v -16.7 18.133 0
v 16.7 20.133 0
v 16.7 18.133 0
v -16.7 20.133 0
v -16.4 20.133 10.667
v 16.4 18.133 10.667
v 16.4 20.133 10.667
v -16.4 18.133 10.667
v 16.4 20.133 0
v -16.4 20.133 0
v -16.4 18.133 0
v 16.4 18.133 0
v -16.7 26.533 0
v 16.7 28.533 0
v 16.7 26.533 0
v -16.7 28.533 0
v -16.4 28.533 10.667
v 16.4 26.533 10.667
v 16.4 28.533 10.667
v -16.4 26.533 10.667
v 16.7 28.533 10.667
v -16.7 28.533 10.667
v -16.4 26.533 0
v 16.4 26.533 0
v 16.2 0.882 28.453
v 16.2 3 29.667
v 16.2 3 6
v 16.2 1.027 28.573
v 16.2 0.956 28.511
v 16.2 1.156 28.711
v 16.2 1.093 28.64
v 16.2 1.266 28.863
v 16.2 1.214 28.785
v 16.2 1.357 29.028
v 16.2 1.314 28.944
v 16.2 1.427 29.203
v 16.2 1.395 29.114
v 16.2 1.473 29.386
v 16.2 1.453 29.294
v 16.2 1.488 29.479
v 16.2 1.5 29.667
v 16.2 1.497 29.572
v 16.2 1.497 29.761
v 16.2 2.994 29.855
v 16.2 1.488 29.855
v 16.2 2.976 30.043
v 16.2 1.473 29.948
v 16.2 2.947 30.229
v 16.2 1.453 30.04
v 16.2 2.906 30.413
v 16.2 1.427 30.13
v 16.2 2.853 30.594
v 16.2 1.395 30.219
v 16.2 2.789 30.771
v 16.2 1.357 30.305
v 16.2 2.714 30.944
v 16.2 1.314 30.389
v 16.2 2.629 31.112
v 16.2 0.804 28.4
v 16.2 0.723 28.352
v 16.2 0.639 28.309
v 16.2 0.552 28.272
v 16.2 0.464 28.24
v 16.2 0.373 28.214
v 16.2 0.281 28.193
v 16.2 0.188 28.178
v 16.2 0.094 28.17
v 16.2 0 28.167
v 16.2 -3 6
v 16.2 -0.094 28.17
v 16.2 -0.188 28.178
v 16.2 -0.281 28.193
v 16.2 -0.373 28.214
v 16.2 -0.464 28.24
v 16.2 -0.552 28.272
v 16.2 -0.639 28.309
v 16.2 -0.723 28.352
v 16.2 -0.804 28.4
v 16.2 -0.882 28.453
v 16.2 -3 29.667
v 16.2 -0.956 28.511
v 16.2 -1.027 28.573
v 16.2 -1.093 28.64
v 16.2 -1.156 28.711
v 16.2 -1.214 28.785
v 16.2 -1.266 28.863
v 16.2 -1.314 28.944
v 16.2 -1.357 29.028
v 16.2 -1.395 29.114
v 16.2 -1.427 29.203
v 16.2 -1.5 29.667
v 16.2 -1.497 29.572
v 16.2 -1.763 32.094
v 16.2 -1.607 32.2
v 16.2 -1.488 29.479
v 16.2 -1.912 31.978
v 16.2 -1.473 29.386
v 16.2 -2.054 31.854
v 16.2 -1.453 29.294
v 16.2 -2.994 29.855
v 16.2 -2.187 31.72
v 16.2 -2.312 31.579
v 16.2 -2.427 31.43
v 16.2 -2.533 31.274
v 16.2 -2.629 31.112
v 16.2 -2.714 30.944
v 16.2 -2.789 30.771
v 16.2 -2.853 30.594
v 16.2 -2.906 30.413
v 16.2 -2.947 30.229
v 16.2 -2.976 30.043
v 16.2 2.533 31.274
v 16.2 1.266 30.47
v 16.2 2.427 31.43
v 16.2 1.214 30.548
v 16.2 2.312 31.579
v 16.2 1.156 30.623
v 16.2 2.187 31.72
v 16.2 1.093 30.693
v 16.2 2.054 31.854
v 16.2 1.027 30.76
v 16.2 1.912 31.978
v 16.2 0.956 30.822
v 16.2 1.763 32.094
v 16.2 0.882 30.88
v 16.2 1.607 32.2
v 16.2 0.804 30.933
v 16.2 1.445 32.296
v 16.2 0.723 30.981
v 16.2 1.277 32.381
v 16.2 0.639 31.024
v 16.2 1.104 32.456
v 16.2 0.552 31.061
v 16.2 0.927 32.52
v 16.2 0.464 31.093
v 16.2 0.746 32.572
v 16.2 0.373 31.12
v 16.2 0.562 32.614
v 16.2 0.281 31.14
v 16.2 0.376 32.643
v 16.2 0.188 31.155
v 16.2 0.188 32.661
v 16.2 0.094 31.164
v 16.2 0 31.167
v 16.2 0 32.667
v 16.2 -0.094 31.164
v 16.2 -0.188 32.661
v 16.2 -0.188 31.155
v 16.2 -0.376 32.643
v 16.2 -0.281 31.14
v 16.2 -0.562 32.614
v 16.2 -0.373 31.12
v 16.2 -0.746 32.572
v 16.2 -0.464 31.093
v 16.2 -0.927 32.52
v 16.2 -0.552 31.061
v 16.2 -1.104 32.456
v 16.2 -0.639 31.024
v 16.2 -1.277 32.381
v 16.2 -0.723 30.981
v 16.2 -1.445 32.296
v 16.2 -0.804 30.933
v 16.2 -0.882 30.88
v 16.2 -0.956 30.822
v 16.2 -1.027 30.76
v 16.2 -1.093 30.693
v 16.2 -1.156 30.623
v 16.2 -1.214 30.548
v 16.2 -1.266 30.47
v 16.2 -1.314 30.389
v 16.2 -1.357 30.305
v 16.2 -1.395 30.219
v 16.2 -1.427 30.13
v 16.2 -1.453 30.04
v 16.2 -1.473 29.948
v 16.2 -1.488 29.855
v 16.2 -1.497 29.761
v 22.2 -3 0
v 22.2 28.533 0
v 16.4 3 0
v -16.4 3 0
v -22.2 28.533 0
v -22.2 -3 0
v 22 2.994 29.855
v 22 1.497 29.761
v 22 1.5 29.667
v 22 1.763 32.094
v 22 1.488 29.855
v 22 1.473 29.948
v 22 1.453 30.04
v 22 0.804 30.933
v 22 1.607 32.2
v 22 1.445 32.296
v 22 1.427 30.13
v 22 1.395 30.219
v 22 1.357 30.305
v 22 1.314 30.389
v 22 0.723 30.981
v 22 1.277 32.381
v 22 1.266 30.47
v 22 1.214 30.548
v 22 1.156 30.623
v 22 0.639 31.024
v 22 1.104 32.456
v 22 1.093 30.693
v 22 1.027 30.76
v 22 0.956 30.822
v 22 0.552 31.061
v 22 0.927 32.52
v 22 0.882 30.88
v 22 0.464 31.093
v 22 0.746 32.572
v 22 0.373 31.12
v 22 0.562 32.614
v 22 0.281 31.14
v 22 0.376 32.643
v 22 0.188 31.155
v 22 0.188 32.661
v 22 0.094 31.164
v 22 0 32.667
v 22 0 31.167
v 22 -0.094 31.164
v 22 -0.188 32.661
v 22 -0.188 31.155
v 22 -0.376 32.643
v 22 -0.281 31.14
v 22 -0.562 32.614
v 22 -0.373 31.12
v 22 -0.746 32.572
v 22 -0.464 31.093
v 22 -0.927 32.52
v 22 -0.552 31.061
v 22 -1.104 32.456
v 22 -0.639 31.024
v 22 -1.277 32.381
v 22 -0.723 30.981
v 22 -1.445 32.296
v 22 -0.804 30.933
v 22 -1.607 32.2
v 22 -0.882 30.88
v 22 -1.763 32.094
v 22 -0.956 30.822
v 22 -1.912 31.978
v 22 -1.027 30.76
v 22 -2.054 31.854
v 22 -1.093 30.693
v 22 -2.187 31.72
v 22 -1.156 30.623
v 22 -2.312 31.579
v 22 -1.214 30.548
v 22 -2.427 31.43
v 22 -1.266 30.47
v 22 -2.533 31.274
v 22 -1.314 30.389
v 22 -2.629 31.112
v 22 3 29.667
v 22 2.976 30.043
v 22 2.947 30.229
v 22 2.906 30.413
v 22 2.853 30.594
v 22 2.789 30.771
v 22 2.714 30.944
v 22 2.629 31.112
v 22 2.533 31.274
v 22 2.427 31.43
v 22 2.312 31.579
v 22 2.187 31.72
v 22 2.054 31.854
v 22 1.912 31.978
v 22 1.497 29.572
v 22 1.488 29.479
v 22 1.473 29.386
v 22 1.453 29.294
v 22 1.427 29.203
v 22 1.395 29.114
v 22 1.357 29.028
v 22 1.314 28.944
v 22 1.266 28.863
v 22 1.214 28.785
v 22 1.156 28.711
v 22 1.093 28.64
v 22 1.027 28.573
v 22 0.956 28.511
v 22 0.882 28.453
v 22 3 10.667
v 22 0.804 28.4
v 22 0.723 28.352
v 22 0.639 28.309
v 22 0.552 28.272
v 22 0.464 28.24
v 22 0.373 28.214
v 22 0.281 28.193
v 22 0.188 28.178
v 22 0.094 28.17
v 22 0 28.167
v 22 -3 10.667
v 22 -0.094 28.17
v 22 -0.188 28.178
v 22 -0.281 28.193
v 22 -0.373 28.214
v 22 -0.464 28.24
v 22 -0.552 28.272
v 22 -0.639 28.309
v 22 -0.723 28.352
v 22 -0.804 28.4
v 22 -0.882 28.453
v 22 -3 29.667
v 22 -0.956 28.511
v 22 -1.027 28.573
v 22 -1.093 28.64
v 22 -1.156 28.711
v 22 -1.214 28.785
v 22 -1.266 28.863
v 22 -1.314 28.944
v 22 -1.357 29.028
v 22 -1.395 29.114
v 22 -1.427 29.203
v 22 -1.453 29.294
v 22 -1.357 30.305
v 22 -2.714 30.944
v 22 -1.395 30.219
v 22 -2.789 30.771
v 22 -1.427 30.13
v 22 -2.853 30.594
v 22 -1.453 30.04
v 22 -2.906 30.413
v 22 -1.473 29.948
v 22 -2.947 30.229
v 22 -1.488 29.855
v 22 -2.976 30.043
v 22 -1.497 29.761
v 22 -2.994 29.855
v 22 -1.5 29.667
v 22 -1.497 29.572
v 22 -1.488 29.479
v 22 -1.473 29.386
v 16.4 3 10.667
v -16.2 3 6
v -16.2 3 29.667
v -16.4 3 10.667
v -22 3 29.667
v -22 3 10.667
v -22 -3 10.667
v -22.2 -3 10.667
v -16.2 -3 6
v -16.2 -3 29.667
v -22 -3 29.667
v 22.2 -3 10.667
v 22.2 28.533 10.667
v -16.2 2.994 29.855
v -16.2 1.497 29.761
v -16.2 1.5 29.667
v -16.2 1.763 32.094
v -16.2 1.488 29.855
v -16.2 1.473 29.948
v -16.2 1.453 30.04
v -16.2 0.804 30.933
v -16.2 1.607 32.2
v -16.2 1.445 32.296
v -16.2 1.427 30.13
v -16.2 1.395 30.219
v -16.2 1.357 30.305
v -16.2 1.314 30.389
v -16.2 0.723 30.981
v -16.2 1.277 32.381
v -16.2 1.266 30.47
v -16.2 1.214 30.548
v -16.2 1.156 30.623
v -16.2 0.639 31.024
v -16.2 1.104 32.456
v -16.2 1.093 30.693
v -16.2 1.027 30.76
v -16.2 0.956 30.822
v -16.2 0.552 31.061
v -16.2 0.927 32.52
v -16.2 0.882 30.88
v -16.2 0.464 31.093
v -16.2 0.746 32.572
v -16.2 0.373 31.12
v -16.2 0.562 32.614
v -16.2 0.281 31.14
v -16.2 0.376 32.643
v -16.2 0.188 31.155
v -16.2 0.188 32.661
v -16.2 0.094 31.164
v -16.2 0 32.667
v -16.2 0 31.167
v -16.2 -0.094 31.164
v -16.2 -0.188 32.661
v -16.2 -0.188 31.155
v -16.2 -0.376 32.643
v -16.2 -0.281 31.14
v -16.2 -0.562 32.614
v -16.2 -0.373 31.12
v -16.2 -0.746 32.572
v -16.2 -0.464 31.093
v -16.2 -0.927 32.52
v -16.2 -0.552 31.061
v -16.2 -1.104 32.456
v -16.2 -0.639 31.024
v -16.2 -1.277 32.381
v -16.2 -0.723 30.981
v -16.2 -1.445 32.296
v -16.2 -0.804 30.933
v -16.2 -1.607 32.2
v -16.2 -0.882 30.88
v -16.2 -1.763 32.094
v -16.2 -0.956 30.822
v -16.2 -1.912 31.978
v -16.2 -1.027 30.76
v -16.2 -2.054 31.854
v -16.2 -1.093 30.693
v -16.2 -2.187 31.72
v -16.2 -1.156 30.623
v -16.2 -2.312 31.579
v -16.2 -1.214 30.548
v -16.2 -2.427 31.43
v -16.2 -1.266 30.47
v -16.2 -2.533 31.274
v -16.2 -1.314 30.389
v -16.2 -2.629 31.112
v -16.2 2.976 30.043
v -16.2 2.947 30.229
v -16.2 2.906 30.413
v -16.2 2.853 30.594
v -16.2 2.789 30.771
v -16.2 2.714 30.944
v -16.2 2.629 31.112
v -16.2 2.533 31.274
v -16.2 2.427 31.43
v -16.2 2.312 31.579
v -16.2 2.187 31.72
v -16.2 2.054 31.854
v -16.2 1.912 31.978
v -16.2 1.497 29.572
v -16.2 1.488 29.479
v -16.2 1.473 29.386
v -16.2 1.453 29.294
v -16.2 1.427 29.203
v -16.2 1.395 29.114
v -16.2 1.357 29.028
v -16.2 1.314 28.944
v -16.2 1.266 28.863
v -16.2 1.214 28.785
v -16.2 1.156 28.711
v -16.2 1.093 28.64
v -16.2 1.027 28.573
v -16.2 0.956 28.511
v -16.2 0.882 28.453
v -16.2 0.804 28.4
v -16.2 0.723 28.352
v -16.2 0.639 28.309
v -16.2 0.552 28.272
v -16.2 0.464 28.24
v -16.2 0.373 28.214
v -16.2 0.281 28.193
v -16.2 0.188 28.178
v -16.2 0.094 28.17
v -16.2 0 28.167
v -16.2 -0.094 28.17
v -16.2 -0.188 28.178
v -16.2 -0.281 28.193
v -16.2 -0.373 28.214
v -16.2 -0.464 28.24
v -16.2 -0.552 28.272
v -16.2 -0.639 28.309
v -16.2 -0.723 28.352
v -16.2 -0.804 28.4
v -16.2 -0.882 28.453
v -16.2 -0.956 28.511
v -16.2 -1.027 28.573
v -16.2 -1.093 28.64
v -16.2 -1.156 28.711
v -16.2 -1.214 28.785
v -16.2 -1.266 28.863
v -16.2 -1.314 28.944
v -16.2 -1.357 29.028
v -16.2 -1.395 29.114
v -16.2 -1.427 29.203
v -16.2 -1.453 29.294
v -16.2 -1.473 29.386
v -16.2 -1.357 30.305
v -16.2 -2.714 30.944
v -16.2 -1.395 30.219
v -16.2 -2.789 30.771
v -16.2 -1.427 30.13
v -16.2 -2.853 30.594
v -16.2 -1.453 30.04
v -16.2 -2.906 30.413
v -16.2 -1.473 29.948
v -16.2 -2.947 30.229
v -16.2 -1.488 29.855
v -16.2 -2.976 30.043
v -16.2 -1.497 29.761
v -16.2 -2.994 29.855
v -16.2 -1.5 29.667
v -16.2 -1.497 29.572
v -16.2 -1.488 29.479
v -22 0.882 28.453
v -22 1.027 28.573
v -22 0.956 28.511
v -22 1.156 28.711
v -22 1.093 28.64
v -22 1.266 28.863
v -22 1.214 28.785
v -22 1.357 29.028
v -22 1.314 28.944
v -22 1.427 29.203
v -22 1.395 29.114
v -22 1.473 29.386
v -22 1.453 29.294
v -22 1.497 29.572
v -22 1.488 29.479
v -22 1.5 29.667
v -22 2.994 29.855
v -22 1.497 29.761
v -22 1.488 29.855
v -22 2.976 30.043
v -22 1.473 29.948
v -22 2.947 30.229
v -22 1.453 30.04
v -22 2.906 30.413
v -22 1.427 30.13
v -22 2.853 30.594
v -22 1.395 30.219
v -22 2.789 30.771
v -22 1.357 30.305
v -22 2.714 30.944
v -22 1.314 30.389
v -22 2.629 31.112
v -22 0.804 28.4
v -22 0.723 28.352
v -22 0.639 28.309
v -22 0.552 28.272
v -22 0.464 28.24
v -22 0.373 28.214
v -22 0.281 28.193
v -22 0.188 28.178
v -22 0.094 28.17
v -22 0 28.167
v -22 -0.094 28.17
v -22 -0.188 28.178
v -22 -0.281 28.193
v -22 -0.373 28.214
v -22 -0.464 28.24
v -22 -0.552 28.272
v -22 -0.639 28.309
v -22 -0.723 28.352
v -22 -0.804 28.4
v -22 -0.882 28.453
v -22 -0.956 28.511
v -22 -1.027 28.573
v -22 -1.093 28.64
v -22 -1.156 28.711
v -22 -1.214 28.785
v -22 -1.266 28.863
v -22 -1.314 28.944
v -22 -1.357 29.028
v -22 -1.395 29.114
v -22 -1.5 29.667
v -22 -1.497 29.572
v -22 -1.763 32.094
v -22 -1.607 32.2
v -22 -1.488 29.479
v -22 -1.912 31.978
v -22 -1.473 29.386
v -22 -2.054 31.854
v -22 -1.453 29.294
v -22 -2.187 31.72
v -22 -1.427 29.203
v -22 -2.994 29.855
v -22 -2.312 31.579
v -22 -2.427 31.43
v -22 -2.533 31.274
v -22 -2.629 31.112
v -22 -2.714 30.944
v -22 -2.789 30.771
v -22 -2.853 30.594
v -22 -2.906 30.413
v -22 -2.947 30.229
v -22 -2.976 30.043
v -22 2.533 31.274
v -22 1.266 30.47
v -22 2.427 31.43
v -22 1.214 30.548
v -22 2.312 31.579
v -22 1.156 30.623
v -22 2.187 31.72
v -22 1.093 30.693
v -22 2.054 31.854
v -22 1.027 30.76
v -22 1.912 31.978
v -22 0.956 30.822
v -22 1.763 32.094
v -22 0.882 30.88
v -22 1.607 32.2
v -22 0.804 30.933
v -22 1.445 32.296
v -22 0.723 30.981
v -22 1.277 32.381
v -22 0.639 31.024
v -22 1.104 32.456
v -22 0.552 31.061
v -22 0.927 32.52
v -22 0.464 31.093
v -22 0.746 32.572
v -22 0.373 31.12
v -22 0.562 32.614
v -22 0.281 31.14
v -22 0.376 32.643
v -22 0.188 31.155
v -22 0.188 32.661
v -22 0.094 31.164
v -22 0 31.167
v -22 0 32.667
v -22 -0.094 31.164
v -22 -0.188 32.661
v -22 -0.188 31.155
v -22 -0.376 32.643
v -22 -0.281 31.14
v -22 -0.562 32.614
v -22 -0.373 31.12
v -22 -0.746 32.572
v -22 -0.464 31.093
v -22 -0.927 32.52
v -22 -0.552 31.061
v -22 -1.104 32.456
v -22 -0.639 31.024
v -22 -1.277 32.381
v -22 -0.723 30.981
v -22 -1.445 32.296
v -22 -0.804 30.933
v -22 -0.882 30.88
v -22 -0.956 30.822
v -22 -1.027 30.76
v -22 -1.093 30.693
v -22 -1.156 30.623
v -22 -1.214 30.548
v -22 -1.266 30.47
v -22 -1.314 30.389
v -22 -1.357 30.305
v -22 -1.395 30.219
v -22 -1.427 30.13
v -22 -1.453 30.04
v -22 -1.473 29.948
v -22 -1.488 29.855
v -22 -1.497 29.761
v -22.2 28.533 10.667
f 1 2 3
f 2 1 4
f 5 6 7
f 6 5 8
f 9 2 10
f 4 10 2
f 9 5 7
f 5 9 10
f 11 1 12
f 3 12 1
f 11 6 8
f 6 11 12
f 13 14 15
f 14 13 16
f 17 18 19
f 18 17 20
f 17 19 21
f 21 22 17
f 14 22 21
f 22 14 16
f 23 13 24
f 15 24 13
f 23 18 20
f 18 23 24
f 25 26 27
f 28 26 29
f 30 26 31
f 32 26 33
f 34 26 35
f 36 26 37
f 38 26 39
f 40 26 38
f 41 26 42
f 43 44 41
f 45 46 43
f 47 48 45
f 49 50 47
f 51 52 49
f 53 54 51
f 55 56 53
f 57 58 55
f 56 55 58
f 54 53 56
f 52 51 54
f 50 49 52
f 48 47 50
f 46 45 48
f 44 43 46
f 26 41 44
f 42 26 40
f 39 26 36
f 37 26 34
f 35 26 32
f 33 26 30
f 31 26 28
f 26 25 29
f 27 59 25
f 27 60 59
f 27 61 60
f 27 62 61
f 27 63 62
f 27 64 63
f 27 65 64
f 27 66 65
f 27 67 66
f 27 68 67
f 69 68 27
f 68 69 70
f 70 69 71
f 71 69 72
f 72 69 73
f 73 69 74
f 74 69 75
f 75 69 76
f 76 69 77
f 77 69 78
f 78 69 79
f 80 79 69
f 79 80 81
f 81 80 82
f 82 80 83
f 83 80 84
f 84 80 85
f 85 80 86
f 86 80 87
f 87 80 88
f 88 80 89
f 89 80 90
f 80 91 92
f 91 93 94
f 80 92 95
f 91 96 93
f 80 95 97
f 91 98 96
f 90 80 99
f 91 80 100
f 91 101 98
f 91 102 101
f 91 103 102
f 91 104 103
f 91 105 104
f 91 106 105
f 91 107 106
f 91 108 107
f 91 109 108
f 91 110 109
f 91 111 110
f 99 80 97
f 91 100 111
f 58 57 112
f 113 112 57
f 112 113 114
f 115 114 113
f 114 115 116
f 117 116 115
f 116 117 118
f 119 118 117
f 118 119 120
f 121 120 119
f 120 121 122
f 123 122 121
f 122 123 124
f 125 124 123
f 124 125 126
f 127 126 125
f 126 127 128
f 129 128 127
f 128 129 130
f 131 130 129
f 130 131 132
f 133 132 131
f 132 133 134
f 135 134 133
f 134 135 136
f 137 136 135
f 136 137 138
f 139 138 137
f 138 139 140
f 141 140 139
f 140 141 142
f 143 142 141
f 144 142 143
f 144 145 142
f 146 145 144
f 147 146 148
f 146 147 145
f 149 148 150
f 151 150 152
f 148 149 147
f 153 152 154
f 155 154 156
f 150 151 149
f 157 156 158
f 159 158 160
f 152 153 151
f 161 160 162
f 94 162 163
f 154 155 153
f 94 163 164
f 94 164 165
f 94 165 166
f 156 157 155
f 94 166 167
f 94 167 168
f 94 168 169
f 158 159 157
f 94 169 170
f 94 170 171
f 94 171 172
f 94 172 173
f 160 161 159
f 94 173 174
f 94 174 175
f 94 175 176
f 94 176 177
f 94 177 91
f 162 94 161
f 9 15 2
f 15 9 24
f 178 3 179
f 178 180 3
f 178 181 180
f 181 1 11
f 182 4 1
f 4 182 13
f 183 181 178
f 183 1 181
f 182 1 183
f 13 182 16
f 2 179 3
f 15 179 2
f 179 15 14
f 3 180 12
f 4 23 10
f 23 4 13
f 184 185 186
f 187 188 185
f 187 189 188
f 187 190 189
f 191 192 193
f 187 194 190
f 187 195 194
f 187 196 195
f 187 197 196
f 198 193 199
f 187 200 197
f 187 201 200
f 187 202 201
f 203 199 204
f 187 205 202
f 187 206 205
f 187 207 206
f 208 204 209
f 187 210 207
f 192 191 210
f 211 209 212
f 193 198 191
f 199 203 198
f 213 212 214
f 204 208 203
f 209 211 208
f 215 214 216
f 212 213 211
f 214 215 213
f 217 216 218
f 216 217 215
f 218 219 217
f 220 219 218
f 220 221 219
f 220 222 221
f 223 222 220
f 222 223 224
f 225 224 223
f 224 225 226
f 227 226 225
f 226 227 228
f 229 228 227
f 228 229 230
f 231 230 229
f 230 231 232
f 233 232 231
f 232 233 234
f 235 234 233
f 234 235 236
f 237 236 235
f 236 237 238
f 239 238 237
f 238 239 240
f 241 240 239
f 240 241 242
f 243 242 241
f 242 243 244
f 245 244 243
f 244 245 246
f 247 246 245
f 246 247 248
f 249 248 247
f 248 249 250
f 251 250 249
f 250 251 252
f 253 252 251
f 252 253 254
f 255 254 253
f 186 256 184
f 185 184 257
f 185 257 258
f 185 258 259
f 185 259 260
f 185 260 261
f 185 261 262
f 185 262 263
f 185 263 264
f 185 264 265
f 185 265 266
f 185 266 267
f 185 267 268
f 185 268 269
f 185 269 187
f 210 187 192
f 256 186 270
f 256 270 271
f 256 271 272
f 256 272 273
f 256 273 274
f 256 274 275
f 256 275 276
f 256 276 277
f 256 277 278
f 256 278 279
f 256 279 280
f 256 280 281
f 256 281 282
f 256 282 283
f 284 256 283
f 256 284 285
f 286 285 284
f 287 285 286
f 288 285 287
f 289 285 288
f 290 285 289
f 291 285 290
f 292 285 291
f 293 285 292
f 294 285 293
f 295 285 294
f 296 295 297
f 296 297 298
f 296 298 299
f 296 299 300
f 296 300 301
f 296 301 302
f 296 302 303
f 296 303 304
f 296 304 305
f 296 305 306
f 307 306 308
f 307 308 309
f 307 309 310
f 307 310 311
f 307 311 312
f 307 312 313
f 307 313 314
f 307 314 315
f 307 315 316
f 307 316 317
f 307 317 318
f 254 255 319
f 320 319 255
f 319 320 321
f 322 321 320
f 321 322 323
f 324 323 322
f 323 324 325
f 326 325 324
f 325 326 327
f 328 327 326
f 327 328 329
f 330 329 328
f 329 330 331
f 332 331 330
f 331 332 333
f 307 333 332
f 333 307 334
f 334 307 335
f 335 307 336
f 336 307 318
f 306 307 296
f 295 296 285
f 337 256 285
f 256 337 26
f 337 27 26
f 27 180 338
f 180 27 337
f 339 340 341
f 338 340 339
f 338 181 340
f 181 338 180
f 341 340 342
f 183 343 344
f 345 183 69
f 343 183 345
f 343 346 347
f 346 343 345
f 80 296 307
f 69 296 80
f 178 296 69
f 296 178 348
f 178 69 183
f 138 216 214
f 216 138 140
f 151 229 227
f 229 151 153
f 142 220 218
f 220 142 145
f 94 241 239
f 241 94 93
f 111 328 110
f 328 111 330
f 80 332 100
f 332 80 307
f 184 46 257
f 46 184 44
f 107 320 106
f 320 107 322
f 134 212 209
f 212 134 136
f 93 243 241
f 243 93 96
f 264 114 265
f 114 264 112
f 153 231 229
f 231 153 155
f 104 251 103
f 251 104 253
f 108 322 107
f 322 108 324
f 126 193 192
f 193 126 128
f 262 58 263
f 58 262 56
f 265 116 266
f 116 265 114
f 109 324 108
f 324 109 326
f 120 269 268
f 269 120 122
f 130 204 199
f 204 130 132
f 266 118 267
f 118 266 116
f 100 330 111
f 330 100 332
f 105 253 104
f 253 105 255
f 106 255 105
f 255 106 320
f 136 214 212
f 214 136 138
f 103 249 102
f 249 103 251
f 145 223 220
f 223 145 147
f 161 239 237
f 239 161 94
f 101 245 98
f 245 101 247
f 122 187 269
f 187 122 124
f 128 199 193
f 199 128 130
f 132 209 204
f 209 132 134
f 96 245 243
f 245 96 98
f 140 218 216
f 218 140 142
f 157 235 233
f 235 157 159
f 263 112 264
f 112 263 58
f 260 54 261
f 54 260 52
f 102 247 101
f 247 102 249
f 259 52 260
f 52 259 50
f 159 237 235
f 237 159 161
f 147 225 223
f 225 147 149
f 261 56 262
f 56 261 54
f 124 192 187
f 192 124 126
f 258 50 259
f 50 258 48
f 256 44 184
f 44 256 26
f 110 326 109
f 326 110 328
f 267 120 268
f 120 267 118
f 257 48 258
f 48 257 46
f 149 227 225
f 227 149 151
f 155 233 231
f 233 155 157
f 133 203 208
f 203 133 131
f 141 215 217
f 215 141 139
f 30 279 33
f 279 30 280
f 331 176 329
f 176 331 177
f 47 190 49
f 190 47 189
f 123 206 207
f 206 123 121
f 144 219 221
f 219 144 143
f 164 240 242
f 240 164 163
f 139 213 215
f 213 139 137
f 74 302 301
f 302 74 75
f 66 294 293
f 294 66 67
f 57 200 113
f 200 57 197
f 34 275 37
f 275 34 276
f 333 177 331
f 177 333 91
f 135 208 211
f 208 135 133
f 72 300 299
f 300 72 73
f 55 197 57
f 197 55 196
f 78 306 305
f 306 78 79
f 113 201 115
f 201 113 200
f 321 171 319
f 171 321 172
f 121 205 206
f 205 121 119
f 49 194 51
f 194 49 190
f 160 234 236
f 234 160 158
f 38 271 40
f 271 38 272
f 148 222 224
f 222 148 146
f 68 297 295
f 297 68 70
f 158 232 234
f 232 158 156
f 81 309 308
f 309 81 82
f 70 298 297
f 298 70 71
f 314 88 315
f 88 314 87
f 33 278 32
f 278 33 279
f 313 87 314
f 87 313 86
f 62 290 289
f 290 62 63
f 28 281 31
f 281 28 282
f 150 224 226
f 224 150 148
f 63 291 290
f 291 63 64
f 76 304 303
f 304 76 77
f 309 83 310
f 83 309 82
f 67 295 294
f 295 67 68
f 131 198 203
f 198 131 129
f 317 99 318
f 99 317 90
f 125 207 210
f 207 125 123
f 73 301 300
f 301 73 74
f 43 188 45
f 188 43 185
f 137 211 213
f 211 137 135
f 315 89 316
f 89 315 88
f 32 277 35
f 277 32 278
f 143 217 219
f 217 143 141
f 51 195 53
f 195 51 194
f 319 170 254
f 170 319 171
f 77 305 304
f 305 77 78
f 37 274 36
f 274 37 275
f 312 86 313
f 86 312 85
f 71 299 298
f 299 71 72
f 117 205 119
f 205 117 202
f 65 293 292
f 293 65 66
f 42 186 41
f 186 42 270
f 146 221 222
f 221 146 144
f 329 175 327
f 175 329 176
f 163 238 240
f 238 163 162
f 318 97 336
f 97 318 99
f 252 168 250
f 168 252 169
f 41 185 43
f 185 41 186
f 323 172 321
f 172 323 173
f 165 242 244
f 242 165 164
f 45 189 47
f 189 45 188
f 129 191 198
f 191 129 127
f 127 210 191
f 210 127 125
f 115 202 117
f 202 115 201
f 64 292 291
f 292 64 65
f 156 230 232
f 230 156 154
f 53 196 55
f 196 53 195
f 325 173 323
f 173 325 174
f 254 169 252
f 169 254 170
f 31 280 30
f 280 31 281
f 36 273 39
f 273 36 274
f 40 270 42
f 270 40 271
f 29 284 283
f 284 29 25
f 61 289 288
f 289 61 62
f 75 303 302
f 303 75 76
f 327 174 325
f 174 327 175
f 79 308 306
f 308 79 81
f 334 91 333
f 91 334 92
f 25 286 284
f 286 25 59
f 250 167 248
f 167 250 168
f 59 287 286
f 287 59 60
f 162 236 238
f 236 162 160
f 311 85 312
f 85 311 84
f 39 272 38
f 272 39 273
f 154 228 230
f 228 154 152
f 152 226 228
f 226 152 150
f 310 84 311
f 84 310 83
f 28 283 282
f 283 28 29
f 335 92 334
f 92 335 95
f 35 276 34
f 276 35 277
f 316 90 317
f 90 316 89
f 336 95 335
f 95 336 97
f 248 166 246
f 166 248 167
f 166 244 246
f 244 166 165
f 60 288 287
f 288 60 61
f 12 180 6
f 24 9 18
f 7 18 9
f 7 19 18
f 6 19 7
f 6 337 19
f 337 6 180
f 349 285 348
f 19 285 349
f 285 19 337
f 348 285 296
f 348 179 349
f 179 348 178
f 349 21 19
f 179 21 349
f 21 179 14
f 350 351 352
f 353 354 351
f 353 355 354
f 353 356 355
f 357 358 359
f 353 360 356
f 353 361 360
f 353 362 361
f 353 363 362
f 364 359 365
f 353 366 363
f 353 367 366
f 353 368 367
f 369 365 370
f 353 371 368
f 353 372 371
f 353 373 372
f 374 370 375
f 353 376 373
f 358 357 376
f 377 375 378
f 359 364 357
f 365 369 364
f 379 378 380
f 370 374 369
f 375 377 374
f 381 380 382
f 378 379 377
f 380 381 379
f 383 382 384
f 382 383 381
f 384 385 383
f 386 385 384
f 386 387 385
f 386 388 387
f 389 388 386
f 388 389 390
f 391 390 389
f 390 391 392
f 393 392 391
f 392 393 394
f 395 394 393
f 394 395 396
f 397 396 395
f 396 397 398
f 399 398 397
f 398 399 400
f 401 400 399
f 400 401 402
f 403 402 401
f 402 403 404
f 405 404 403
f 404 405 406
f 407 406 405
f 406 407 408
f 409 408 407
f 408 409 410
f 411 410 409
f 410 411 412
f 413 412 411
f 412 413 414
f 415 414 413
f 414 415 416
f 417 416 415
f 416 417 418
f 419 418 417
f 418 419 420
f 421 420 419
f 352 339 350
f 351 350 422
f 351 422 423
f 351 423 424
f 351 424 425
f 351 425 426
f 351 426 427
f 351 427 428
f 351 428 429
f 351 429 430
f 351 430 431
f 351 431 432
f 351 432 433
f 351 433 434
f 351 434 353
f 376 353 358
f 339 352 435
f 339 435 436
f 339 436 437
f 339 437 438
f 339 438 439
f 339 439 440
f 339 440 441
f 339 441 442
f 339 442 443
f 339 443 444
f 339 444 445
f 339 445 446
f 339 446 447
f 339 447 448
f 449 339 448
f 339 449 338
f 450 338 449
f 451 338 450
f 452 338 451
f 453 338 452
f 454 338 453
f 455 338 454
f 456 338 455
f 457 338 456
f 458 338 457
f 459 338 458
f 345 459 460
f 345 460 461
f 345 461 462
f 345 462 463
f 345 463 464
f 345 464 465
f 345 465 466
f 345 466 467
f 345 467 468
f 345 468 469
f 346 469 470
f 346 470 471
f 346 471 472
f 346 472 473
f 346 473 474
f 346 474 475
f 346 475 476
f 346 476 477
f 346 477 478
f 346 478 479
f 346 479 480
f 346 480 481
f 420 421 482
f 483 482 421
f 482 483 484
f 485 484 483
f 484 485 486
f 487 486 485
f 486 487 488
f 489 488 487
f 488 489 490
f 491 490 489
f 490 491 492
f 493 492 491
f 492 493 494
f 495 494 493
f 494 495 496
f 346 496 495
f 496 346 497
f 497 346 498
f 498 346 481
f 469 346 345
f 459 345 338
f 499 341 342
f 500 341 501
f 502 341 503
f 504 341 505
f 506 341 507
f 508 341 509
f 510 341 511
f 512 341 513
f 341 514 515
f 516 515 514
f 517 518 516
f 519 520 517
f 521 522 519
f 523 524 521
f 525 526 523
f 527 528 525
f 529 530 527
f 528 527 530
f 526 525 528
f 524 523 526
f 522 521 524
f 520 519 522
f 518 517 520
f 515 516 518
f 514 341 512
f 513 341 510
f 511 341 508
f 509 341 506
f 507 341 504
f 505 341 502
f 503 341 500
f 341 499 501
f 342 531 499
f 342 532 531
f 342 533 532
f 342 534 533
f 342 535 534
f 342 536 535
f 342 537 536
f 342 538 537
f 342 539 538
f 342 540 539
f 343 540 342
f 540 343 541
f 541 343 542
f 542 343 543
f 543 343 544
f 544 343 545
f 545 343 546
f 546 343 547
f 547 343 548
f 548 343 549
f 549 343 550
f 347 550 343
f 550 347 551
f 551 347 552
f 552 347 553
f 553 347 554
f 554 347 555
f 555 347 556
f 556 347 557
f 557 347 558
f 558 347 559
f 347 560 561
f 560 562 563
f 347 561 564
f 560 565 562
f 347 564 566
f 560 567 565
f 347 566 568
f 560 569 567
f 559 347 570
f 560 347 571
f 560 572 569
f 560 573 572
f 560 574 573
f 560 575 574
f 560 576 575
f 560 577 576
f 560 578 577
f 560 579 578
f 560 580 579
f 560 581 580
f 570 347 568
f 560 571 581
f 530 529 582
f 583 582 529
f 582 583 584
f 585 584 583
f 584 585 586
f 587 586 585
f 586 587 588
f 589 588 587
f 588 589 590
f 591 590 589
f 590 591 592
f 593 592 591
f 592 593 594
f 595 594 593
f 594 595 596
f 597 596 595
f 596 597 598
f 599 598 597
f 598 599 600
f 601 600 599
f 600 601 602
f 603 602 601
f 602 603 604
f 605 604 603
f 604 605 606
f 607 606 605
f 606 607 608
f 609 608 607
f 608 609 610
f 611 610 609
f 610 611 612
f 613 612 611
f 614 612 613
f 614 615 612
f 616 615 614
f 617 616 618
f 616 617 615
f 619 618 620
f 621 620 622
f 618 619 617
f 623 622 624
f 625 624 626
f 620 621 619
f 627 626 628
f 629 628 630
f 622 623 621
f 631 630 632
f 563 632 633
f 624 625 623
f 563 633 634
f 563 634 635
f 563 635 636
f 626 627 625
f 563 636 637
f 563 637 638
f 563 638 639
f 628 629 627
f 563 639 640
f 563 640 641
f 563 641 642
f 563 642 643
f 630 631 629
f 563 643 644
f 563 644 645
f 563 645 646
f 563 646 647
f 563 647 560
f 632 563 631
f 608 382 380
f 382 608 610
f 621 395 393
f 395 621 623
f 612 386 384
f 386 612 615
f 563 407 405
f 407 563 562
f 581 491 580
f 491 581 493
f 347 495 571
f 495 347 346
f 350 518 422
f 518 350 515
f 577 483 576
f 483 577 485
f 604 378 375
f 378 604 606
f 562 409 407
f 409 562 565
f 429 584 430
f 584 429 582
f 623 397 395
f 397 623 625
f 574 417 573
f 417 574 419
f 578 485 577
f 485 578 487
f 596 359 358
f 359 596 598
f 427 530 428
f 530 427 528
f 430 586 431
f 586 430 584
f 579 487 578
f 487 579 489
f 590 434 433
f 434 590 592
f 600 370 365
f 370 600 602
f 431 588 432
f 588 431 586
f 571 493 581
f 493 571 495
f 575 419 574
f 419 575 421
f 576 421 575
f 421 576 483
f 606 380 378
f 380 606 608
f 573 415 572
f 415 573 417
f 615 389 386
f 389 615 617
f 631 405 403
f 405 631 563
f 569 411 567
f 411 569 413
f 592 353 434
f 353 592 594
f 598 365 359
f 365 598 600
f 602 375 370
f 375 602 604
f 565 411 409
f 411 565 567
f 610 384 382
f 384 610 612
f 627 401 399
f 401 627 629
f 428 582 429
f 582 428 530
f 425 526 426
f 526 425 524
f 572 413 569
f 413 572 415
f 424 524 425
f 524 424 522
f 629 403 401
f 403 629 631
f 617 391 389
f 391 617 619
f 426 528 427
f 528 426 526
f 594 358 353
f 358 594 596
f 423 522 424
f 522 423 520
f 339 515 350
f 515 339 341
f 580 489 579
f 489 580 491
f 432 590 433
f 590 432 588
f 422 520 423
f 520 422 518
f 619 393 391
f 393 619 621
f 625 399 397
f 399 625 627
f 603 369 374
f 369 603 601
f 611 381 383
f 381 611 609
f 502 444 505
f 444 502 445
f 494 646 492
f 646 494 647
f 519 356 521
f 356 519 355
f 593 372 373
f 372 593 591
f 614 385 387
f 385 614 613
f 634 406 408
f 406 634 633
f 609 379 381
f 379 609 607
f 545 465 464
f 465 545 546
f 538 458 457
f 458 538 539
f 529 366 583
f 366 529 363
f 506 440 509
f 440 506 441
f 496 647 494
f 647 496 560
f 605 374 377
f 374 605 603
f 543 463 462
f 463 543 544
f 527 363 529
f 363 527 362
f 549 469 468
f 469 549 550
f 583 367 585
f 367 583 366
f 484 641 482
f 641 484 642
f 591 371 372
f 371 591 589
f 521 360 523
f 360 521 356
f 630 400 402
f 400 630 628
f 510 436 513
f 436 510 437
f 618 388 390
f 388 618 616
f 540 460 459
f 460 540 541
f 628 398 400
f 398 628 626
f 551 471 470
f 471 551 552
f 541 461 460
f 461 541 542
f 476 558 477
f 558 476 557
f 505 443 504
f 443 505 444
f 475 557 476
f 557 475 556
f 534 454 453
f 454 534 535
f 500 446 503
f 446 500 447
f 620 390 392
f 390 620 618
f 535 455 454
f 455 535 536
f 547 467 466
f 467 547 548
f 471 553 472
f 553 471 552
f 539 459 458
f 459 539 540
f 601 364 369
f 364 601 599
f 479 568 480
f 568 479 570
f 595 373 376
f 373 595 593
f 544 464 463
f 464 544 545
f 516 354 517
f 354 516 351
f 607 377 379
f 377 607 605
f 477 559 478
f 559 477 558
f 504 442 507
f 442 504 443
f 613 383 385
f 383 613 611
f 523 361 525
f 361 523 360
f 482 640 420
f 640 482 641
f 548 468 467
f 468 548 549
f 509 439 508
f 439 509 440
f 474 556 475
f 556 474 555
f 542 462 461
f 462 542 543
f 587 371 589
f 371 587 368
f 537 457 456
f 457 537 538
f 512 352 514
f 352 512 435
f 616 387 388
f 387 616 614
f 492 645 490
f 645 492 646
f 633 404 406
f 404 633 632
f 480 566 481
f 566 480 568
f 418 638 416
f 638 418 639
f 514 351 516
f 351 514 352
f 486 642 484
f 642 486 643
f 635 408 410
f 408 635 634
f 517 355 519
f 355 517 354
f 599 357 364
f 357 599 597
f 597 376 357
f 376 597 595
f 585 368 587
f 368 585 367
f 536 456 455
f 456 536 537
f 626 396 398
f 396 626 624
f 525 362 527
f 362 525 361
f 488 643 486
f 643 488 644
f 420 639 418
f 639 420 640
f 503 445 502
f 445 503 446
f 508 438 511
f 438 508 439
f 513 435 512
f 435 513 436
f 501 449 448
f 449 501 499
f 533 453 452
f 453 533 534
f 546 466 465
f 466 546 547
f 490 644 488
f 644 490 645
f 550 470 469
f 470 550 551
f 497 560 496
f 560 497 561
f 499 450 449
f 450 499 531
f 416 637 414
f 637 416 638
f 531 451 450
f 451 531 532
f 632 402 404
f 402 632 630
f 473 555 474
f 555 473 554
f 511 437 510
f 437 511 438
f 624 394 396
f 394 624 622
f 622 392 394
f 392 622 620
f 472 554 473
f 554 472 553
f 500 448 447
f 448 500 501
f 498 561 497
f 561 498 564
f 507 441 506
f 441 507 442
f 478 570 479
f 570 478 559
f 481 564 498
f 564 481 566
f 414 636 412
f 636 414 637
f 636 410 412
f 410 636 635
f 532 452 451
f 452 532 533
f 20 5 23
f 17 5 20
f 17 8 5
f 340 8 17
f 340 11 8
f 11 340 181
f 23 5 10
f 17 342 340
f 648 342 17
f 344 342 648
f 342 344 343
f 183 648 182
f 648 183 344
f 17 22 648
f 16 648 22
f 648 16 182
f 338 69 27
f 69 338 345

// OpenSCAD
// file: hinge.scad
function side_len(hyp, other) = sqrt(hyp*hyp - other * other);
function hyp_len(side1, side2) = sqrt(side1*side1 + side2*side2);

module outer_hinge(outer_diam, axis_diam, inner_width, outer_width, gap)
{
  difference() {
    total_width = inner_width + outer_width * 2;
    union() {
      cylinder(d = outer_diam, h= total_width, center = true);
      inner_radius = hyp_len(inner_width /2 + gap, outer_diam /2);
      rotate([0,90,0]) {
	difference() {
	  cylinder(d=total_width, h=outer_diam, center = true);
	  cylinder(r=inner_radius, h=outer_diam+1, center = true);
	  translate([-total_width, 0, -outer_diam]) {
	    cube([total_width*2 , total_width , outer_diam *2]);
	  }
	}
      }
    }
    cylinder(d = axis_diam, h = total_width + 1, center = true);
    cylinder(d =outer_diam * 1.1, h = inner_width + gap * 2, center = true);
  }
}

module inner_hinge(outer_diam, axis_diam, inner_width)
{
  difference() {
    cylinder(d =outer_diam, h = inner_width, center = true);
    cylinder(d =outer_diam, h = inner_width+1, center = true);
  }
}
$fn = 100;

outer_diam = 6;
axis_diam = 3;
inner_width = 10;
outer_width = 4;
gap = 0.2;
outer_hinge(outer_diam, axis_diam, inner_width,outer_width, gap);
inner_hinge(outer_diam, axis_diam, inner_width);
// file: params.scad
width = 6;
lower_length = 80;
upper_length = 70;
scale = 1/3;
axis_diam = 3;
hinge_inner = 10;
hinge_outer = 5;
slide_diam = 8;
slide_offset = 12;
upper_strut_dist = 16;
guide_thickness = 2;
gap = 0.2;
$fn=100;
// file: leg.scad
use <hinge.scad>

include <params.scad>

module lower_leg(width, length, upper_strut_dist, axis_diam, hinge_inner)
{
  difference() {
    union() {
      translate([0,0,-lower_length+width/2]) {
	intersection() {
	  translate([-width/2, -width/2, -width/2]) {
	    cube([width, width, lower_length + upper_strut_dist]);
	  }
	  cylinder(d1=width, d2= width*5, h=  lower_length + upper_strut_dist + 1);
    }
	sphere(d=width);
      }
      rotate([0,90,0]) {
	cylinder(d=width, h = hinge_inner, center = true);
      }
      translate([0,0,upper_strut_dist]) {
	rotate([0,90,0]) {
	  cylinder(d=width, h = hinge_inner, center = true);
	}
      }
    }
    // Holes
    rotate([0,90,0]) {
      cylinder(d=axis_diam, h = hinge_inner+1, center = true);
    }
    translate([0,0,upper_strut_dist]) {
      rotate([0,90,0]) {
	cylinder(d=axis_diam, h = hinge_inner+1, center = true);
	}
    }
  }
}


module upper_strut(width, length, scale, axis_diam, hinge_inner, hinge_outer, gap) {
  hinge_offset = (hinge_inner + hinge_outer)/2;
  
  translate([-length + hinge_offset,-width/2, -width/2]) {
    cube([length * (1+scale) - hinge_offset * 2, width, width]);
  }
 
   
  translate([-length,0,0]) {
    rotate([0,90,90]) {
      outer_hinge(width,axis_diam, hinge_inner, hinge_outer, gap);
    }
  }
  translate([length*scale,0,0]) {
    rotate([0,90,-90]) {
      outer_hinge(width,axis_diam, hinge_inner, hinge_outer, gap);
    }
  }
  
}

module upper_leg(width, length, scale, axis_diam, hinge_inner, hinge_outer, gap, slide_diam, slide_offset) {
  hinge_offset = (hinge_inner + hinge_outer)/2;
  difference() {
    union() {
      translate([-length + hinge_offset,-width/2, -width/2]) {
	cube([length * (1+scale) - hinge_offset, width, width]);
      }
      
      
      translate([-length,0,0]) {
	rotate([0,90,90]) {
	  outer_hinge(width,axis_diam, hinge_inner, hinge_outer, gap);
	}
      }

      // Inner hinges
      cylinder(d=width*2, h= width, center = true);

      translate([length*scale,0,0]) {
	rotate([90,0,0]) {
	  cylinder(d=width, h= hinge_inner, center = true);
	}
      }

      // Guide ball
      translate([length*scale,0,0]) {
	translate([0,0, -slide_offset+slide_diam/2]) {
	  cylinder(d=width, h = slide_offset - slide_diam /2);
	  sphere(d=slide_diam);
	}
      }
    }

    // Holes
    cylinder(d=axis_diam, h= width+1, center = true);

    translate([length*scale,0,0]) {
      rotate([90,0,0]) {
	cylinder(d=axis_diam, h= hinge_inner+1, center = true);
      }
    }
  }
}

module guide_strut(width, length, upper_strut_dist, scale, axis_diam, hinge_inner, hinge_outer, gap) {
  hinge_offset = (hinge_inner + hinge_outer)/2;
  difference() {
    union() {
      rotate([-90,0,90]) {
	outer_hinge(width,axis_diam, hinge_inner, hinge_outer, gap);
      }
      translate([0,width*0.1,hinge_offset]) {
	cylinder(d=width*0.8,h=length*scale - hinge_offset);
      }
      translate([-width/2,-width/2,hinge_offset]) {
	cube([width, width, upper_strut_dist - hinge_offset]);
      }
      translate([0,0, upper_strut_dist]) {
	rotate([90,0,90]) {
	  cylinder(d=width,h=hinge_inner, center = true);
	}
      }
      translate([0,0, length*scale]) {
	sphere(d = width);
      }
    }
    translate([0,0,upper_strut_dist]) {
      rotate([90,0,90]) {
	cylinder(d=axis_diam, h= hinge_inner+1, center = true);
      }
    }
  }
}

module gimbal(width, axis_diam, hinge_inner, hinge_outer, gap)
{
  inner_width = hinge_inner + hinge_outer*2;

  for (a = [0,180]) {
    rotate([0,a,0]) {
      translate([0,0,width + gap]) {
	difference() {
	  cube([inner_width+width, width,width], center=true);
	  cylinder(d=axis_diam, h=width+1,center = true);
	}
      }
      translate([-(inner_width+width)/2,0,0]) {
	difference() {
	  union() {
	    cube([width, width,(width+gap)*2], center=true);
	    translate([0,0,(width+gap)]) {
	      rotate([90,0,0]) {
		cylinder(d=width, h=width, center=true);
	      }
	    }
	    translate([0,0,-(width+gap)]) {
	      rotate([90,0,0]) {
		cylinder(d=width, h=width, center=true);
	      }
	    }
	  }
	  rotate([0,90,0]) {
	    cylinder(d=axis_diam, h=width + 1, center = true);
	  }
	}
      }
    }
  }
    
}

module base(upper_length, lower_length, scale, guide_thickness, width, axis_diam, hinge_outer, hinge_inner, upper_strut_dist) {
  guide_length= hinge_inner + hinge_outer*2 + gap *2+width*2+1;
  guide_height = lower_length * scale - upper_strut_dist;
  translate([0,upper_length*scale, lower_length * scale + width/2]) {
    translate([-guide_length/2, -(width/2+gap)-guide_thickness, -guide_height]) {
      cube([guide_length,guide_thickness,guide_height]);
    }
    translate([-guide_length/2, width/2+gap, -guide_height]) {
      cube([guide_length,guide_thickness,guide_height]);
  
    }
  }
  translate([-guide_length/2, -width/2, lower_length * scale - width/2]) {
      cube([guide_length,width,width]);
  }
  for (s = [1,-1]) {
    scale([s,1,1]) {
      difference() {
	translate([-hinge_inner/2 - hinge_outer-width*2, -width/2, 0]) {
	  cube([width - gap, width, lower_length * scale+width/2]);
	  translate([0, width/2,0]) {
	    rotate([0,90,0]) {
	      cylinder(d=width, h=width-gap);
	    }
	  }
	}
	translate([-hinge_inner/2 - hinge_outer-width*2-gap, 0, 0]) {
	  rotate([0,90,0]) {
	    cylinder(d=axis_diam, h=width+gap*2);
	  }
	}
      }
      translate([-hinge_inner/2 - hinge_outer-width*2-gap, -width/2, lower_length * scale+width/2 -guide_height]) {
	cube([width-gap, upper_length*scale+ width + guide_thickness + gap, guide_height]);
      }
    }
  }
  

}

translate([0,-upper_length,0]) {
  lower_leg(width, lower_length, upper_strut_dist, axis_diam, hinge_inner);
}
rotate([0,0,90]) {
  upper_leg(width, upper_length, scale, axis_diam, hinge_inner, hinge_outer, gap, slide_diam, slide_offset);
  translate([0,0,upper_strut_dist]) {
    upper_strut(width, upper_length, scale, axis_diam, hinge_inner, hinge_outer, gap);
  }
}

translate([0,upper_length * scale,0]) {
 
  guide_strut(width, lower_length, upper_strut_dist, scale, axis_diam, hinge_inner, hinge_outer, gap);
  
}

gimbal(width, axis_diam, hinge_inner, hinge_outer, gap);

base(upper_length, lower_length, scale, guide_thickness,  width, axis_diam, hinge_outer, hinge_inner,upper_strut_dist);
// main file
use <leg.scad>
include <params.scad>

rotate([0,180,0]) {
  translate([0,0,-lower_length*scale-width/2]) {
    base(upper_length, lower_length, scale, guide_thickness,  width, axis_diam, hinge_outer, hinge_inner,upper_strut_dist);
  }
}
